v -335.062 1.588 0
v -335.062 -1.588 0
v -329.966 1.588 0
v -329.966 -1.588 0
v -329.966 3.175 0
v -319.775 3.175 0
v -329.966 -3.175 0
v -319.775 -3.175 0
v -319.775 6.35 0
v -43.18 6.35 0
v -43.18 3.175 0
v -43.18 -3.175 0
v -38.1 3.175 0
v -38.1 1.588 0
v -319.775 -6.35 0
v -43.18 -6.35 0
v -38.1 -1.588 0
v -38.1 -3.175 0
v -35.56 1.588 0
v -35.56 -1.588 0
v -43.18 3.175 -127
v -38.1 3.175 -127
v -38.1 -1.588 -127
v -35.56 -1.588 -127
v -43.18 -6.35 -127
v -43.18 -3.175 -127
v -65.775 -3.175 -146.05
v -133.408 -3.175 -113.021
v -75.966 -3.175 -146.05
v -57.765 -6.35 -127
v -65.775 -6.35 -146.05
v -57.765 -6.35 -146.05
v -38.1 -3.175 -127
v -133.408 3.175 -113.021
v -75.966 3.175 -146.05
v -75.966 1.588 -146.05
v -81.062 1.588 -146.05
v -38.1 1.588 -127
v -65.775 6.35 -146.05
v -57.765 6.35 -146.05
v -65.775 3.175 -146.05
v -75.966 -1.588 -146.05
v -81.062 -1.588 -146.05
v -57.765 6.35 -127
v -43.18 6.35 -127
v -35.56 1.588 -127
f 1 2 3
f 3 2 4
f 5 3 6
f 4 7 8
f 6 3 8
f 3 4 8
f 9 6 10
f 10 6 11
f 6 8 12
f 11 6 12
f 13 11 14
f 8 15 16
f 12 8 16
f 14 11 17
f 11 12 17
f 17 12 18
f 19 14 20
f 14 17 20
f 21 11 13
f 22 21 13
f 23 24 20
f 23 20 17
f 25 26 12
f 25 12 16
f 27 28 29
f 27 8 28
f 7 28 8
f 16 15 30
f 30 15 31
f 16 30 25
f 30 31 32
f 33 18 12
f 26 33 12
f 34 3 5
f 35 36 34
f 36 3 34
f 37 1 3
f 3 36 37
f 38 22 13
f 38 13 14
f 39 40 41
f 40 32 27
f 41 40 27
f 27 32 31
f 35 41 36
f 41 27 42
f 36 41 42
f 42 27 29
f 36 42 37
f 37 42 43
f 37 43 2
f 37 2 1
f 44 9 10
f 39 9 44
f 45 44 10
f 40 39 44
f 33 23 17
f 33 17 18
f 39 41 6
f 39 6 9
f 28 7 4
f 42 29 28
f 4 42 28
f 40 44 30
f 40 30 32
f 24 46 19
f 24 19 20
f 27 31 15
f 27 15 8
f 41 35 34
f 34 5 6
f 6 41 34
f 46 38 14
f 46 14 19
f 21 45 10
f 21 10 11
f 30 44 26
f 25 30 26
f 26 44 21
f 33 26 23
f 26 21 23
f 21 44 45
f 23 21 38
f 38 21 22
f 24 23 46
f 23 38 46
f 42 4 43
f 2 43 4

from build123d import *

# Parameters (mm, degrees)
BOSS_EXTRUDE1_DEPTH      = 6.35
BOSS_EXTRUDE1_DEPTH_BACK = 6.35
SKETCH2_W                = 292.995908675
SKETCH2_H                = 3.175
CUT_EXTRUDE1_DEPTH       = 38.1
SKETCH3_W                = 146.05
SKETCH3_H                = 3.175
CUT_EXTRUDE2_DEPTH       = 38.1
CUT_EXTRUDE3_DEPTH       = 3.175
CUT_EXTRUDE4_DEPTH       = 3.175
SKETCH6_W                = 5.08
SKETCH6_H                = 3.175
CUT_EXTRUDE5_DEPTH       = 157.099
CUT_EXTRUDE6_DEPTH       = 339.217
CUT_EXTRUDE6_DEPTH_BACK  = 157.099
SKETCH9_W                = 50.8
SKETCH9_H                = 19.05
CUT_EXTRUDE7_DEPTH       = 21.59
SKETCH11_W               = 6.965000048
SKETCH11_H               = 19.05
CUT_EXTRUDE10_DEPTH      = 366.729881683


with BuildPart() as part:
    # Sketch1 → Boss-Extrude1 (new, two sides: drawn at the far end of the back side and taken through both)
    with BuildSketch(Plane(origin=(0, 0, 0), x_dir=(1, 0, 0), z_dir=(0, 1, 0)).offset(-BOSS_EXTRUDE1_DEPTH_BACK)):
        Polygon((-406.4, 0), (0, 0), (0, 146.05), (-152.4, 146.05), align=None)
    extrude(amount=BOSS_EXTRUDE1_DEPTH + BOSS_EXTRUDE1_DEPTH_BACK)

    # Sketch2 → Cut-Extrude1 (cut)
    with BuildSketch(Plane(origin=(-100.979614843, 0, -175.616721465), x_dir=(-0.8669063030575352, 0, 0.49847112425808277), z_dir=(-0.4984711242580827, 0, -0.8669063030575351))):
        with Locations((205.812767226, 4.7625)):
            Rectangle(SKETCH2_W, SKETCH2_H)
        with Locations((205.812767226, -4.7625)):
            Rectangle(SKETCH2_W, SKETCH2_H)
    extrude(amount=-CUT_EXTRUDE1_DEPTH, mode=Mode.SUBTRACT)

    # Sketch3 → Cut-Extrude2 (cut)
    with BuildSketch(Plane(origin=(0, 0, 0), x_dir=(0, 0, -1), z_dir=(1, 0, 0))):
        with Locations((73.025, 4.7625)):
            Rectangle(SKETCH3_W, SKETCH3_H)
        with Locations((73.025, -4.7625)):
            Rectangle(SKETCH3_W, SKETCH3_H)
    extrude(amount=-CUT_EXTRUDE2_DEPTH, mode=Mode.SUBTRACT)

    # Sketch4 → Cut-Extrude3 (cut)
    with BuildSketch(Plane(origin=(0, 6.35, 0), x_dir=(1, 0, 0), z_dir=(0, 1, 0))):
        Polygon((-133.408250166, 113.020869854), (-75.966284694, 146.05), (-152.4, 146.05), align=None)
    extrude(amount=-CUT_EXTRUDE3_DEPTH, mode=Mode.SUBTRACT)

    # Sketch5 → Cut-Extrude4 (cut)
    with BuildSketch(Plane.XZ.offset(6.35)):
        Polygon((-133.408250166, -113.020869854), (-75.966284694, -146.05), (-152.4, -146.05), align=None)
    extrude(amount=-CUT_EXTRUDE4_DEPTH, mode=Mode.SUBTRACT)

    # Sketch6 → Cut-Extrude5 (cut)
    with BuildSketch(Plane(origin=(0, 0, -146.05), x_dir=(-1, 0, 0), z_dir=(0, 0, -1))):
        Polygon((0, -3.175), (38.1, -3.175), (38.1, -1.5875), (35.56, -1.5875), (35.56, 1.5875), (38.1, 1.5875), (38.1, 3.175), (0, 3.175), align=None)
        with Locations((40.64, -4.7625)):
            Rectangle(SKETCH6_W, SKETCH6_H)
        with Locations((40.64, 4.7625)):
            Rectangle(SKETCH6_W, SKETCH6_H)
    extrude(amount=-CUT_EXTRUDE5_DEPTH, mode=Mode.SUBTRACT)

    # Sketch8 → Cut-Extrude6 (cut, two sides: drawn at the far end of the back side and taken through both)
    with BuildSketch(Plane(origin=(-51.420385157, 0, 29.566721465), x_dir=(0.49847112425808243, 0, 0.8669063030575355), z_dir=(-0.8669063030575355, 0, 0.49847112425808243)).offset(-CUT_EXTRUDE6_DEPTH_BACK)):
        Polygon((-164.478664898, 1.5875), (-164.478664898, 3.175), (-159.398664898, 3.175), (-159.398664898, 6.35), (-164.478664898, 6.35), (-202.578664898, 6.35), (-202.578664898, -6.35), (-164.478664898, -6.35), (-159.398664898, -6.35), (-159.398664898, -3.175), (-164.478664898, -3.175), (-164.478664898, -1.5875), (-167.018664898, -1.5875), (-167.018664898, 1.5875), align=None)
    extrude(amount=CUT_EXTRUDE6_DEPTH + CUT_EXTRUDE6_DEPTH_BACK, mode=Mode.SUBTRACT)

    # Sketch9 → Cut-Extrude7 (cut)
    with BuildSketch(Plane(origin=(0, 6.35, 0), x_dir=(1, 0, 0), z_dir=(0, 1, 0))):
        with Locations((-25.4, 136.525)):
            Rectangle(SKETCH9_W, SKETCH9_H)
    extrude(amount=-CUT_EXTRUDE7_DEPTH, mode=Mode.SUBTRACT)

    # Sketch11 → Cut-Extrude10 (cut, through all)
    with BuildSketch(Plane(origin=(0, 6.35, 0), x_dir=(1, 0, 0), z_dir=(0, 1, 0))):
        with Locations((-54.282500024, 136.525)):
            Rectangle(SKETCH11_W, SKETCH11_H)
    extrude(amount=-CUT_EXTRUDE10_DEPTH, mode=Mode.SUBTRACT)


solid = part.part
